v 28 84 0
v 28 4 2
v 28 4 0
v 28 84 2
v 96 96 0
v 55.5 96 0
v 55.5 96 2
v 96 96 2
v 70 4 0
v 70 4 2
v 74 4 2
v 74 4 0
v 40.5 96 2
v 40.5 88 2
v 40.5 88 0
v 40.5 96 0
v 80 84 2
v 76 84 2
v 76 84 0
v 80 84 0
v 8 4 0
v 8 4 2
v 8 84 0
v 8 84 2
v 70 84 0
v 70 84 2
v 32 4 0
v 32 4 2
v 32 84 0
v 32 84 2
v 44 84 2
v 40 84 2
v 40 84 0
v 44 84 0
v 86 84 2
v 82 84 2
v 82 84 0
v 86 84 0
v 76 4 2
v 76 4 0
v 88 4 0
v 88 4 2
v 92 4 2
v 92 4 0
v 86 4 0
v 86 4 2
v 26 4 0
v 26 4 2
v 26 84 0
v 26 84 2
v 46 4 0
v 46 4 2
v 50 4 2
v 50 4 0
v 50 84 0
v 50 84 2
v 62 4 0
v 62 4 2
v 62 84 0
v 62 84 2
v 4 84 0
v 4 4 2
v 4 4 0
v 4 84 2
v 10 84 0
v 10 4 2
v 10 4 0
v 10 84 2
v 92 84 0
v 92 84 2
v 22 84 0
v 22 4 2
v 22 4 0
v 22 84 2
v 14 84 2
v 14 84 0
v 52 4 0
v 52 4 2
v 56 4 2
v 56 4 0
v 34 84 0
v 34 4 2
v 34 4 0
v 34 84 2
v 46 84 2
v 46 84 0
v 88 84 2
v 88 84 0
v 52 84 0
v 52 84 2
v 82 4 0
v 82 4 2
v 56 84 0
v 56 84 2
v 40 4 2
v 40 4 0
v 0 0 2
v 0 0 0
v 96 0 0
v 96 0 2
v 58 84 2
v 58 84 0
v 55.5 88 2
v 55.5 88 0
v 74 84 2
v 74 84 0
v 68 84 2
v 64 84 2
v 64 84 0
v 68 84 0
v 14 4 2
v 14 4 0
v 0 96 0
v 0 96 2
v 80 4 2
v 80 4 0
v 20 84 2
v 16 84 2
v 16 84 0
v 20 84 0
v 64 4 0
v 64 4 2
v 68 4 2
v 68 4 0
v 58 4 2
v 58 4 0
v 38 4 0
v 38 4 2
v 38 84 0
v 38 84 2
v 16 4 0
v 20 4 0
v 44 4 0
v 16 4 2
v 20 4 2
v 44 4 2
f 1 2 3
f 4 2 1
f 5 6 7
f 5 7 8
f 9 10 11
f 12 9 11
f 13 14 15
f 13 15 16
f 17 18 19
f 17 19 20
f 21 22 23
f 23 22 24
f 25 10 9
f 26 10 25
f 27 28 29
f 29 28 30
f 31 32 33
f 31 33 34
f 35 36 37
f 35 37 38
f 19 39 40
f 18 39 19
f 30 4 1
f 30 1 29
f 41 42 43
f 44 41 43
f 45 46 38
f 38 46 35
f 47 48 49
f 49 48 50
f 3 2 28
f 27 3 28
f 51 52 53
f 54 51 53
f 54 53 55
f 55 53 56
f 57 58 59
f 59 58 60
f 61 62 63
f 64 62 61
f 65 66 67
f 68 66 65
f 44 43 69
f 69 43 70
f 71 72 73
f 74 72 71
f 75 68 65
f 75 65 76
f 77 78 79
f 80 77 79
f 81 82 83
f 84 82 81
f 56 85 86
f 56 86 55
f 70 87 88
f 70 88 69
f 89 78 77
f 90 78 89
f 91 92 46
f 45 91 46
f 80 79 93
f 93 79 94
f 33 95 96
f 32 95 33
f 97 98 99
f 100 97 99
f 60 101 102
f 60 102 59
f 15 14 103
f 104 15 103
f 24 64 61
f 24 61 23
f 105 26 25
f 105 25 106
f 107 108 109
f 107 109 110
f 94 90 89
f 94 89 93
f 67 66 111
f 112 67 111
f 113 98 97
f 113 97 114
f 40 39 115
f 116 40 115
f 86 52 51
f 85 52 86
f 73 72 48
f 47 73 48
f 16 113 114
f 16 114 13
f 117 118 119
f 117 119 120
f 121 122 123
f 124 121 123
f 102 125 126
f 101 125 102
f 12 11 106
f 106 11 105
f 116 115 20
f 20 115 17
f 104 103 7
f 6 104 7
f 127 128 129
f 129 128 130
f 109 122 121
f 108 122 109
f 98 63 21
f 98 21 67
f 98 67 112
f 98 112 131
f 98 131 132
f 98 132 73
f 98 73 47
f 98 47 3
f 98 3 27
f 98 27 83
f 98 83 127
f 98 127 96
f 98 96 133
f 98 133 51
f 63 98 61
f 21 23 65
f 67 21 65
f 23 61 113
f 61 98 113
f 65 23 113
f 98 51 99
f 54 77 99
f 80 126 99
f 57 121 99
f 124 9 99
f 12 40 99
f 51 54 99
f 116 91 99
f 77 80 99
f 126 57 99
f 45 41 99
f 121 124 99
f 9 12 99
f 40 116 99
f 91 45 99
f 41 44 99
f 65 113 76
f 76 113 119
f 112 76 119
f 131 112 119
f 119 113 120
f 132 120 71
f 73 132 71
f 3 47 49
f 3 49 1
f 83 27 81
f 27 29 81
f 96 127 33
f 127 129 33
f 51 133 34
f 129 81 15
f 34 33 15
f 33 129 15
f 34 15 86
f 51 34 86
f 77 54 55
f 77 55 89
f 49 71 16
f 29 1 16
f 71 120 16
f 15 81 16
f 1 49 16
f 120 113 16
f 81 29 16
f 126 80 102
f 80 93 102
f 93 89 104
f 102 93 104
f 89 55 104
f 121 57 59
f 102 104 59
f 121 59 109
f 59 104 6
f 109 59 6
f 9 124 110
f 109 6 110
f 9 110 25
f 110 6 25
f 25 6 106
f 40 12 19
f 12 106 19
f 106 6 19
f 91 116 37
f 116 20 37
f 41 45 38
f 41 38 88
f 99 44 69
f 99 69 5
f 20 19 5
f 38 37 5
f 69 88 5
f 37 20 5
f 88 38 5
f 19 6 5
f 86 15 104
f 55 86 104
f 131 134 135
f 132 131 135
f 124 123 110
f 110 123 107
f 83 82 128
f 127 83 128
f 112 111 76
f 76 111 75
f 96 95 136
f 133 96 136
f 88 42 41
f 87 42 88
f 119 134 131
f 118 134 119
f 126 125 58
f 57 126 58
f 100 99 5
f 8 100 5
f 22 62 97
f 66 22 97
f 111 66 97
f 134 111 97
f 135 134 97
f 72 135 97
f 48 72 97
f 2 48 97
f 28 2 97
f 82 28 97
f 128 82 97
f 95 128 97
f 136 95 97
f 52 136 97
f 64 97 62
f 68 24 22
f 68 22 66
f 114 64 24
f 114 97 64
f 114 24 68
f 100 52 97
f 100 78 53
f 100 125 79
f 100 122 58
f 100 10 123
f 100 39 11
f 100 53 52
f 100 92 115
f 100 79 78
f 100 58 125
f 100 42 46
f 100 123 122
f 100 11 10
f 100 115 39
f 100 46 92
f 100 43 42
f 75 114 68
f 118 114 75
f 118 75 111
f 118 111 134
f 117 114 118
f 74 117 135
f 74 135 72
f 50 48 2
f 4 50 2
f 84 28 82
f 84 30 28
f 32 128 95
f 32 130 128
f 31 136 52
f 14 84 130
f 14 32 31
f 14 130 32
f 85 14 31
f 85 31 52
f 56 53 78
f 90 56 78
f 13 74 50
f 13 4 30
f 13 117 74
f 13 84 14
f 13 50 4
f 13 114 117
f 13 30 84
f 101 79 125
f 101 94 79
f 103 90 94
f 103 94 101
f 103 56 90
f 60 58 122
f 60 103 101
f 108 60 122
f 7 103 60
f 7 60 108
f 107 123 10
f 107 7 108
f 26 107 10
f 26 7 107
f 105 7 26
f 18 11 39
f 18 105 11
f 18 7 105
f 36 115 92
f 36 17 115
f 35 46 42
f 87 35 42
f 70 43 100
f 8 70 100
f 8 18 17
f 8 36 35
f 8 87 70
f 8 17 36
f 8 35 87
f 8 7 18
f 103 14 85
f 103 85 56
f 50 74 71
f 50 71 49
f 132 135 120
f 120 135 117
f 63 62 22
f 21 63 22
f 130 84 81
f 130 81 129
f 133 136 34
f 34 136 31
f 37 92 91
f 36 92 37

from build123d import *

# Parameters (mm, degrees)
SKETCH1_W             = 96
SKETCH1_H             = 96
BOSS_EXTRUDE2_DEPTH   = 2
FINGER_OPENING_HOLE_W = 15
FINGER_OPENING_HOLE_H = 8
OPENING_HOLE_DEPTH    = 2
AIRFLOW_W             = 4
AIRFLOW_H             = 80
AIR_FLOW_DEPTH        = 2


with BuildPart() as part:
    # Sketch1 → Boss-Extrude2 (new body)
    with BuildSketch(Plane.XY):
        with Locations((48, 48)):
            Rectangle(SKETCH1_W, SKETCH1_H)
    extrude(amount=BOSS_EXTRUDE2_DEPTH)

    # Finger Opening Hole → Opening Hole (cut)
    with BuildSketch(Plane.XY.offset(2)):
        with Locations((48, 92)):
            Rectangle(FINGER_OPENING_HOLE_W, FINGER_OPENING_HOLE_H)
    extrude(amount=-OPENING_HOLE_DEPTH, mode=Mode.SUBTRACT)

    # Airflow → Air Flow (cut)
    with BuildSketch(Plane.XY.offset(2)):
        with Locations((12, 44)):
            Rectangle(AIRFLOW_W, AIRFLOW_H)
        with Locations((6, 44)):
            Rectangle(AIRFLOW_W, AIRFLOW_H)
        with Locations((18, 44)):
            Rectangle(AIRFLOW_W, AIRFLOW_H)
        with Locations((24, 44)):
            Rectangle(AIRFLOW_W, AIRFLOW_H)
        with Locations((30, 44)):
            Rectangle(AIRFLOW_W, AIRFLOW_H)
        with Locations((36, 44)):
            Rectangle(AIRFLOW_W, AIRFLOW_H)
        with Locations((42, 44)):
            Rectangle(AIRFLOW_W, AIRFLOW_H)
        with Locations((48, 44)):
            Rectangle(AIRFLOW_W, AIRFLOW_H)
        with Locations((54, 44)):
            Rectangle(AIRFLOW_W, AIRFLOW_H)
        with Locations((60, 44)):
            Rectangle(AIRFLOW_W, AIRFLOW_H)
        with Locations((66, 44)):
            Rectangle(AIRFLOW_W, AIRFLOW_H)
        with Locations((72, 44)):
            Rectangle(AIRFLOW_W, AIRFLOW_H)
        with Locations((78, 44)):
            Rectangle(AIRFLOW_W, AIRFLOW_H)
        with Locations((84, 44)):
            Rectangle(AIRFLOW_W, AIRFLOW_H)
        with Locations((90, 44)):
            Rectangle(AIRFLOW_W, AIRFLOW_H)
    extrude(amount=-AIR_FLOW_DEPTH, mode=Mode.SUBTRACT)


solid = part.part
